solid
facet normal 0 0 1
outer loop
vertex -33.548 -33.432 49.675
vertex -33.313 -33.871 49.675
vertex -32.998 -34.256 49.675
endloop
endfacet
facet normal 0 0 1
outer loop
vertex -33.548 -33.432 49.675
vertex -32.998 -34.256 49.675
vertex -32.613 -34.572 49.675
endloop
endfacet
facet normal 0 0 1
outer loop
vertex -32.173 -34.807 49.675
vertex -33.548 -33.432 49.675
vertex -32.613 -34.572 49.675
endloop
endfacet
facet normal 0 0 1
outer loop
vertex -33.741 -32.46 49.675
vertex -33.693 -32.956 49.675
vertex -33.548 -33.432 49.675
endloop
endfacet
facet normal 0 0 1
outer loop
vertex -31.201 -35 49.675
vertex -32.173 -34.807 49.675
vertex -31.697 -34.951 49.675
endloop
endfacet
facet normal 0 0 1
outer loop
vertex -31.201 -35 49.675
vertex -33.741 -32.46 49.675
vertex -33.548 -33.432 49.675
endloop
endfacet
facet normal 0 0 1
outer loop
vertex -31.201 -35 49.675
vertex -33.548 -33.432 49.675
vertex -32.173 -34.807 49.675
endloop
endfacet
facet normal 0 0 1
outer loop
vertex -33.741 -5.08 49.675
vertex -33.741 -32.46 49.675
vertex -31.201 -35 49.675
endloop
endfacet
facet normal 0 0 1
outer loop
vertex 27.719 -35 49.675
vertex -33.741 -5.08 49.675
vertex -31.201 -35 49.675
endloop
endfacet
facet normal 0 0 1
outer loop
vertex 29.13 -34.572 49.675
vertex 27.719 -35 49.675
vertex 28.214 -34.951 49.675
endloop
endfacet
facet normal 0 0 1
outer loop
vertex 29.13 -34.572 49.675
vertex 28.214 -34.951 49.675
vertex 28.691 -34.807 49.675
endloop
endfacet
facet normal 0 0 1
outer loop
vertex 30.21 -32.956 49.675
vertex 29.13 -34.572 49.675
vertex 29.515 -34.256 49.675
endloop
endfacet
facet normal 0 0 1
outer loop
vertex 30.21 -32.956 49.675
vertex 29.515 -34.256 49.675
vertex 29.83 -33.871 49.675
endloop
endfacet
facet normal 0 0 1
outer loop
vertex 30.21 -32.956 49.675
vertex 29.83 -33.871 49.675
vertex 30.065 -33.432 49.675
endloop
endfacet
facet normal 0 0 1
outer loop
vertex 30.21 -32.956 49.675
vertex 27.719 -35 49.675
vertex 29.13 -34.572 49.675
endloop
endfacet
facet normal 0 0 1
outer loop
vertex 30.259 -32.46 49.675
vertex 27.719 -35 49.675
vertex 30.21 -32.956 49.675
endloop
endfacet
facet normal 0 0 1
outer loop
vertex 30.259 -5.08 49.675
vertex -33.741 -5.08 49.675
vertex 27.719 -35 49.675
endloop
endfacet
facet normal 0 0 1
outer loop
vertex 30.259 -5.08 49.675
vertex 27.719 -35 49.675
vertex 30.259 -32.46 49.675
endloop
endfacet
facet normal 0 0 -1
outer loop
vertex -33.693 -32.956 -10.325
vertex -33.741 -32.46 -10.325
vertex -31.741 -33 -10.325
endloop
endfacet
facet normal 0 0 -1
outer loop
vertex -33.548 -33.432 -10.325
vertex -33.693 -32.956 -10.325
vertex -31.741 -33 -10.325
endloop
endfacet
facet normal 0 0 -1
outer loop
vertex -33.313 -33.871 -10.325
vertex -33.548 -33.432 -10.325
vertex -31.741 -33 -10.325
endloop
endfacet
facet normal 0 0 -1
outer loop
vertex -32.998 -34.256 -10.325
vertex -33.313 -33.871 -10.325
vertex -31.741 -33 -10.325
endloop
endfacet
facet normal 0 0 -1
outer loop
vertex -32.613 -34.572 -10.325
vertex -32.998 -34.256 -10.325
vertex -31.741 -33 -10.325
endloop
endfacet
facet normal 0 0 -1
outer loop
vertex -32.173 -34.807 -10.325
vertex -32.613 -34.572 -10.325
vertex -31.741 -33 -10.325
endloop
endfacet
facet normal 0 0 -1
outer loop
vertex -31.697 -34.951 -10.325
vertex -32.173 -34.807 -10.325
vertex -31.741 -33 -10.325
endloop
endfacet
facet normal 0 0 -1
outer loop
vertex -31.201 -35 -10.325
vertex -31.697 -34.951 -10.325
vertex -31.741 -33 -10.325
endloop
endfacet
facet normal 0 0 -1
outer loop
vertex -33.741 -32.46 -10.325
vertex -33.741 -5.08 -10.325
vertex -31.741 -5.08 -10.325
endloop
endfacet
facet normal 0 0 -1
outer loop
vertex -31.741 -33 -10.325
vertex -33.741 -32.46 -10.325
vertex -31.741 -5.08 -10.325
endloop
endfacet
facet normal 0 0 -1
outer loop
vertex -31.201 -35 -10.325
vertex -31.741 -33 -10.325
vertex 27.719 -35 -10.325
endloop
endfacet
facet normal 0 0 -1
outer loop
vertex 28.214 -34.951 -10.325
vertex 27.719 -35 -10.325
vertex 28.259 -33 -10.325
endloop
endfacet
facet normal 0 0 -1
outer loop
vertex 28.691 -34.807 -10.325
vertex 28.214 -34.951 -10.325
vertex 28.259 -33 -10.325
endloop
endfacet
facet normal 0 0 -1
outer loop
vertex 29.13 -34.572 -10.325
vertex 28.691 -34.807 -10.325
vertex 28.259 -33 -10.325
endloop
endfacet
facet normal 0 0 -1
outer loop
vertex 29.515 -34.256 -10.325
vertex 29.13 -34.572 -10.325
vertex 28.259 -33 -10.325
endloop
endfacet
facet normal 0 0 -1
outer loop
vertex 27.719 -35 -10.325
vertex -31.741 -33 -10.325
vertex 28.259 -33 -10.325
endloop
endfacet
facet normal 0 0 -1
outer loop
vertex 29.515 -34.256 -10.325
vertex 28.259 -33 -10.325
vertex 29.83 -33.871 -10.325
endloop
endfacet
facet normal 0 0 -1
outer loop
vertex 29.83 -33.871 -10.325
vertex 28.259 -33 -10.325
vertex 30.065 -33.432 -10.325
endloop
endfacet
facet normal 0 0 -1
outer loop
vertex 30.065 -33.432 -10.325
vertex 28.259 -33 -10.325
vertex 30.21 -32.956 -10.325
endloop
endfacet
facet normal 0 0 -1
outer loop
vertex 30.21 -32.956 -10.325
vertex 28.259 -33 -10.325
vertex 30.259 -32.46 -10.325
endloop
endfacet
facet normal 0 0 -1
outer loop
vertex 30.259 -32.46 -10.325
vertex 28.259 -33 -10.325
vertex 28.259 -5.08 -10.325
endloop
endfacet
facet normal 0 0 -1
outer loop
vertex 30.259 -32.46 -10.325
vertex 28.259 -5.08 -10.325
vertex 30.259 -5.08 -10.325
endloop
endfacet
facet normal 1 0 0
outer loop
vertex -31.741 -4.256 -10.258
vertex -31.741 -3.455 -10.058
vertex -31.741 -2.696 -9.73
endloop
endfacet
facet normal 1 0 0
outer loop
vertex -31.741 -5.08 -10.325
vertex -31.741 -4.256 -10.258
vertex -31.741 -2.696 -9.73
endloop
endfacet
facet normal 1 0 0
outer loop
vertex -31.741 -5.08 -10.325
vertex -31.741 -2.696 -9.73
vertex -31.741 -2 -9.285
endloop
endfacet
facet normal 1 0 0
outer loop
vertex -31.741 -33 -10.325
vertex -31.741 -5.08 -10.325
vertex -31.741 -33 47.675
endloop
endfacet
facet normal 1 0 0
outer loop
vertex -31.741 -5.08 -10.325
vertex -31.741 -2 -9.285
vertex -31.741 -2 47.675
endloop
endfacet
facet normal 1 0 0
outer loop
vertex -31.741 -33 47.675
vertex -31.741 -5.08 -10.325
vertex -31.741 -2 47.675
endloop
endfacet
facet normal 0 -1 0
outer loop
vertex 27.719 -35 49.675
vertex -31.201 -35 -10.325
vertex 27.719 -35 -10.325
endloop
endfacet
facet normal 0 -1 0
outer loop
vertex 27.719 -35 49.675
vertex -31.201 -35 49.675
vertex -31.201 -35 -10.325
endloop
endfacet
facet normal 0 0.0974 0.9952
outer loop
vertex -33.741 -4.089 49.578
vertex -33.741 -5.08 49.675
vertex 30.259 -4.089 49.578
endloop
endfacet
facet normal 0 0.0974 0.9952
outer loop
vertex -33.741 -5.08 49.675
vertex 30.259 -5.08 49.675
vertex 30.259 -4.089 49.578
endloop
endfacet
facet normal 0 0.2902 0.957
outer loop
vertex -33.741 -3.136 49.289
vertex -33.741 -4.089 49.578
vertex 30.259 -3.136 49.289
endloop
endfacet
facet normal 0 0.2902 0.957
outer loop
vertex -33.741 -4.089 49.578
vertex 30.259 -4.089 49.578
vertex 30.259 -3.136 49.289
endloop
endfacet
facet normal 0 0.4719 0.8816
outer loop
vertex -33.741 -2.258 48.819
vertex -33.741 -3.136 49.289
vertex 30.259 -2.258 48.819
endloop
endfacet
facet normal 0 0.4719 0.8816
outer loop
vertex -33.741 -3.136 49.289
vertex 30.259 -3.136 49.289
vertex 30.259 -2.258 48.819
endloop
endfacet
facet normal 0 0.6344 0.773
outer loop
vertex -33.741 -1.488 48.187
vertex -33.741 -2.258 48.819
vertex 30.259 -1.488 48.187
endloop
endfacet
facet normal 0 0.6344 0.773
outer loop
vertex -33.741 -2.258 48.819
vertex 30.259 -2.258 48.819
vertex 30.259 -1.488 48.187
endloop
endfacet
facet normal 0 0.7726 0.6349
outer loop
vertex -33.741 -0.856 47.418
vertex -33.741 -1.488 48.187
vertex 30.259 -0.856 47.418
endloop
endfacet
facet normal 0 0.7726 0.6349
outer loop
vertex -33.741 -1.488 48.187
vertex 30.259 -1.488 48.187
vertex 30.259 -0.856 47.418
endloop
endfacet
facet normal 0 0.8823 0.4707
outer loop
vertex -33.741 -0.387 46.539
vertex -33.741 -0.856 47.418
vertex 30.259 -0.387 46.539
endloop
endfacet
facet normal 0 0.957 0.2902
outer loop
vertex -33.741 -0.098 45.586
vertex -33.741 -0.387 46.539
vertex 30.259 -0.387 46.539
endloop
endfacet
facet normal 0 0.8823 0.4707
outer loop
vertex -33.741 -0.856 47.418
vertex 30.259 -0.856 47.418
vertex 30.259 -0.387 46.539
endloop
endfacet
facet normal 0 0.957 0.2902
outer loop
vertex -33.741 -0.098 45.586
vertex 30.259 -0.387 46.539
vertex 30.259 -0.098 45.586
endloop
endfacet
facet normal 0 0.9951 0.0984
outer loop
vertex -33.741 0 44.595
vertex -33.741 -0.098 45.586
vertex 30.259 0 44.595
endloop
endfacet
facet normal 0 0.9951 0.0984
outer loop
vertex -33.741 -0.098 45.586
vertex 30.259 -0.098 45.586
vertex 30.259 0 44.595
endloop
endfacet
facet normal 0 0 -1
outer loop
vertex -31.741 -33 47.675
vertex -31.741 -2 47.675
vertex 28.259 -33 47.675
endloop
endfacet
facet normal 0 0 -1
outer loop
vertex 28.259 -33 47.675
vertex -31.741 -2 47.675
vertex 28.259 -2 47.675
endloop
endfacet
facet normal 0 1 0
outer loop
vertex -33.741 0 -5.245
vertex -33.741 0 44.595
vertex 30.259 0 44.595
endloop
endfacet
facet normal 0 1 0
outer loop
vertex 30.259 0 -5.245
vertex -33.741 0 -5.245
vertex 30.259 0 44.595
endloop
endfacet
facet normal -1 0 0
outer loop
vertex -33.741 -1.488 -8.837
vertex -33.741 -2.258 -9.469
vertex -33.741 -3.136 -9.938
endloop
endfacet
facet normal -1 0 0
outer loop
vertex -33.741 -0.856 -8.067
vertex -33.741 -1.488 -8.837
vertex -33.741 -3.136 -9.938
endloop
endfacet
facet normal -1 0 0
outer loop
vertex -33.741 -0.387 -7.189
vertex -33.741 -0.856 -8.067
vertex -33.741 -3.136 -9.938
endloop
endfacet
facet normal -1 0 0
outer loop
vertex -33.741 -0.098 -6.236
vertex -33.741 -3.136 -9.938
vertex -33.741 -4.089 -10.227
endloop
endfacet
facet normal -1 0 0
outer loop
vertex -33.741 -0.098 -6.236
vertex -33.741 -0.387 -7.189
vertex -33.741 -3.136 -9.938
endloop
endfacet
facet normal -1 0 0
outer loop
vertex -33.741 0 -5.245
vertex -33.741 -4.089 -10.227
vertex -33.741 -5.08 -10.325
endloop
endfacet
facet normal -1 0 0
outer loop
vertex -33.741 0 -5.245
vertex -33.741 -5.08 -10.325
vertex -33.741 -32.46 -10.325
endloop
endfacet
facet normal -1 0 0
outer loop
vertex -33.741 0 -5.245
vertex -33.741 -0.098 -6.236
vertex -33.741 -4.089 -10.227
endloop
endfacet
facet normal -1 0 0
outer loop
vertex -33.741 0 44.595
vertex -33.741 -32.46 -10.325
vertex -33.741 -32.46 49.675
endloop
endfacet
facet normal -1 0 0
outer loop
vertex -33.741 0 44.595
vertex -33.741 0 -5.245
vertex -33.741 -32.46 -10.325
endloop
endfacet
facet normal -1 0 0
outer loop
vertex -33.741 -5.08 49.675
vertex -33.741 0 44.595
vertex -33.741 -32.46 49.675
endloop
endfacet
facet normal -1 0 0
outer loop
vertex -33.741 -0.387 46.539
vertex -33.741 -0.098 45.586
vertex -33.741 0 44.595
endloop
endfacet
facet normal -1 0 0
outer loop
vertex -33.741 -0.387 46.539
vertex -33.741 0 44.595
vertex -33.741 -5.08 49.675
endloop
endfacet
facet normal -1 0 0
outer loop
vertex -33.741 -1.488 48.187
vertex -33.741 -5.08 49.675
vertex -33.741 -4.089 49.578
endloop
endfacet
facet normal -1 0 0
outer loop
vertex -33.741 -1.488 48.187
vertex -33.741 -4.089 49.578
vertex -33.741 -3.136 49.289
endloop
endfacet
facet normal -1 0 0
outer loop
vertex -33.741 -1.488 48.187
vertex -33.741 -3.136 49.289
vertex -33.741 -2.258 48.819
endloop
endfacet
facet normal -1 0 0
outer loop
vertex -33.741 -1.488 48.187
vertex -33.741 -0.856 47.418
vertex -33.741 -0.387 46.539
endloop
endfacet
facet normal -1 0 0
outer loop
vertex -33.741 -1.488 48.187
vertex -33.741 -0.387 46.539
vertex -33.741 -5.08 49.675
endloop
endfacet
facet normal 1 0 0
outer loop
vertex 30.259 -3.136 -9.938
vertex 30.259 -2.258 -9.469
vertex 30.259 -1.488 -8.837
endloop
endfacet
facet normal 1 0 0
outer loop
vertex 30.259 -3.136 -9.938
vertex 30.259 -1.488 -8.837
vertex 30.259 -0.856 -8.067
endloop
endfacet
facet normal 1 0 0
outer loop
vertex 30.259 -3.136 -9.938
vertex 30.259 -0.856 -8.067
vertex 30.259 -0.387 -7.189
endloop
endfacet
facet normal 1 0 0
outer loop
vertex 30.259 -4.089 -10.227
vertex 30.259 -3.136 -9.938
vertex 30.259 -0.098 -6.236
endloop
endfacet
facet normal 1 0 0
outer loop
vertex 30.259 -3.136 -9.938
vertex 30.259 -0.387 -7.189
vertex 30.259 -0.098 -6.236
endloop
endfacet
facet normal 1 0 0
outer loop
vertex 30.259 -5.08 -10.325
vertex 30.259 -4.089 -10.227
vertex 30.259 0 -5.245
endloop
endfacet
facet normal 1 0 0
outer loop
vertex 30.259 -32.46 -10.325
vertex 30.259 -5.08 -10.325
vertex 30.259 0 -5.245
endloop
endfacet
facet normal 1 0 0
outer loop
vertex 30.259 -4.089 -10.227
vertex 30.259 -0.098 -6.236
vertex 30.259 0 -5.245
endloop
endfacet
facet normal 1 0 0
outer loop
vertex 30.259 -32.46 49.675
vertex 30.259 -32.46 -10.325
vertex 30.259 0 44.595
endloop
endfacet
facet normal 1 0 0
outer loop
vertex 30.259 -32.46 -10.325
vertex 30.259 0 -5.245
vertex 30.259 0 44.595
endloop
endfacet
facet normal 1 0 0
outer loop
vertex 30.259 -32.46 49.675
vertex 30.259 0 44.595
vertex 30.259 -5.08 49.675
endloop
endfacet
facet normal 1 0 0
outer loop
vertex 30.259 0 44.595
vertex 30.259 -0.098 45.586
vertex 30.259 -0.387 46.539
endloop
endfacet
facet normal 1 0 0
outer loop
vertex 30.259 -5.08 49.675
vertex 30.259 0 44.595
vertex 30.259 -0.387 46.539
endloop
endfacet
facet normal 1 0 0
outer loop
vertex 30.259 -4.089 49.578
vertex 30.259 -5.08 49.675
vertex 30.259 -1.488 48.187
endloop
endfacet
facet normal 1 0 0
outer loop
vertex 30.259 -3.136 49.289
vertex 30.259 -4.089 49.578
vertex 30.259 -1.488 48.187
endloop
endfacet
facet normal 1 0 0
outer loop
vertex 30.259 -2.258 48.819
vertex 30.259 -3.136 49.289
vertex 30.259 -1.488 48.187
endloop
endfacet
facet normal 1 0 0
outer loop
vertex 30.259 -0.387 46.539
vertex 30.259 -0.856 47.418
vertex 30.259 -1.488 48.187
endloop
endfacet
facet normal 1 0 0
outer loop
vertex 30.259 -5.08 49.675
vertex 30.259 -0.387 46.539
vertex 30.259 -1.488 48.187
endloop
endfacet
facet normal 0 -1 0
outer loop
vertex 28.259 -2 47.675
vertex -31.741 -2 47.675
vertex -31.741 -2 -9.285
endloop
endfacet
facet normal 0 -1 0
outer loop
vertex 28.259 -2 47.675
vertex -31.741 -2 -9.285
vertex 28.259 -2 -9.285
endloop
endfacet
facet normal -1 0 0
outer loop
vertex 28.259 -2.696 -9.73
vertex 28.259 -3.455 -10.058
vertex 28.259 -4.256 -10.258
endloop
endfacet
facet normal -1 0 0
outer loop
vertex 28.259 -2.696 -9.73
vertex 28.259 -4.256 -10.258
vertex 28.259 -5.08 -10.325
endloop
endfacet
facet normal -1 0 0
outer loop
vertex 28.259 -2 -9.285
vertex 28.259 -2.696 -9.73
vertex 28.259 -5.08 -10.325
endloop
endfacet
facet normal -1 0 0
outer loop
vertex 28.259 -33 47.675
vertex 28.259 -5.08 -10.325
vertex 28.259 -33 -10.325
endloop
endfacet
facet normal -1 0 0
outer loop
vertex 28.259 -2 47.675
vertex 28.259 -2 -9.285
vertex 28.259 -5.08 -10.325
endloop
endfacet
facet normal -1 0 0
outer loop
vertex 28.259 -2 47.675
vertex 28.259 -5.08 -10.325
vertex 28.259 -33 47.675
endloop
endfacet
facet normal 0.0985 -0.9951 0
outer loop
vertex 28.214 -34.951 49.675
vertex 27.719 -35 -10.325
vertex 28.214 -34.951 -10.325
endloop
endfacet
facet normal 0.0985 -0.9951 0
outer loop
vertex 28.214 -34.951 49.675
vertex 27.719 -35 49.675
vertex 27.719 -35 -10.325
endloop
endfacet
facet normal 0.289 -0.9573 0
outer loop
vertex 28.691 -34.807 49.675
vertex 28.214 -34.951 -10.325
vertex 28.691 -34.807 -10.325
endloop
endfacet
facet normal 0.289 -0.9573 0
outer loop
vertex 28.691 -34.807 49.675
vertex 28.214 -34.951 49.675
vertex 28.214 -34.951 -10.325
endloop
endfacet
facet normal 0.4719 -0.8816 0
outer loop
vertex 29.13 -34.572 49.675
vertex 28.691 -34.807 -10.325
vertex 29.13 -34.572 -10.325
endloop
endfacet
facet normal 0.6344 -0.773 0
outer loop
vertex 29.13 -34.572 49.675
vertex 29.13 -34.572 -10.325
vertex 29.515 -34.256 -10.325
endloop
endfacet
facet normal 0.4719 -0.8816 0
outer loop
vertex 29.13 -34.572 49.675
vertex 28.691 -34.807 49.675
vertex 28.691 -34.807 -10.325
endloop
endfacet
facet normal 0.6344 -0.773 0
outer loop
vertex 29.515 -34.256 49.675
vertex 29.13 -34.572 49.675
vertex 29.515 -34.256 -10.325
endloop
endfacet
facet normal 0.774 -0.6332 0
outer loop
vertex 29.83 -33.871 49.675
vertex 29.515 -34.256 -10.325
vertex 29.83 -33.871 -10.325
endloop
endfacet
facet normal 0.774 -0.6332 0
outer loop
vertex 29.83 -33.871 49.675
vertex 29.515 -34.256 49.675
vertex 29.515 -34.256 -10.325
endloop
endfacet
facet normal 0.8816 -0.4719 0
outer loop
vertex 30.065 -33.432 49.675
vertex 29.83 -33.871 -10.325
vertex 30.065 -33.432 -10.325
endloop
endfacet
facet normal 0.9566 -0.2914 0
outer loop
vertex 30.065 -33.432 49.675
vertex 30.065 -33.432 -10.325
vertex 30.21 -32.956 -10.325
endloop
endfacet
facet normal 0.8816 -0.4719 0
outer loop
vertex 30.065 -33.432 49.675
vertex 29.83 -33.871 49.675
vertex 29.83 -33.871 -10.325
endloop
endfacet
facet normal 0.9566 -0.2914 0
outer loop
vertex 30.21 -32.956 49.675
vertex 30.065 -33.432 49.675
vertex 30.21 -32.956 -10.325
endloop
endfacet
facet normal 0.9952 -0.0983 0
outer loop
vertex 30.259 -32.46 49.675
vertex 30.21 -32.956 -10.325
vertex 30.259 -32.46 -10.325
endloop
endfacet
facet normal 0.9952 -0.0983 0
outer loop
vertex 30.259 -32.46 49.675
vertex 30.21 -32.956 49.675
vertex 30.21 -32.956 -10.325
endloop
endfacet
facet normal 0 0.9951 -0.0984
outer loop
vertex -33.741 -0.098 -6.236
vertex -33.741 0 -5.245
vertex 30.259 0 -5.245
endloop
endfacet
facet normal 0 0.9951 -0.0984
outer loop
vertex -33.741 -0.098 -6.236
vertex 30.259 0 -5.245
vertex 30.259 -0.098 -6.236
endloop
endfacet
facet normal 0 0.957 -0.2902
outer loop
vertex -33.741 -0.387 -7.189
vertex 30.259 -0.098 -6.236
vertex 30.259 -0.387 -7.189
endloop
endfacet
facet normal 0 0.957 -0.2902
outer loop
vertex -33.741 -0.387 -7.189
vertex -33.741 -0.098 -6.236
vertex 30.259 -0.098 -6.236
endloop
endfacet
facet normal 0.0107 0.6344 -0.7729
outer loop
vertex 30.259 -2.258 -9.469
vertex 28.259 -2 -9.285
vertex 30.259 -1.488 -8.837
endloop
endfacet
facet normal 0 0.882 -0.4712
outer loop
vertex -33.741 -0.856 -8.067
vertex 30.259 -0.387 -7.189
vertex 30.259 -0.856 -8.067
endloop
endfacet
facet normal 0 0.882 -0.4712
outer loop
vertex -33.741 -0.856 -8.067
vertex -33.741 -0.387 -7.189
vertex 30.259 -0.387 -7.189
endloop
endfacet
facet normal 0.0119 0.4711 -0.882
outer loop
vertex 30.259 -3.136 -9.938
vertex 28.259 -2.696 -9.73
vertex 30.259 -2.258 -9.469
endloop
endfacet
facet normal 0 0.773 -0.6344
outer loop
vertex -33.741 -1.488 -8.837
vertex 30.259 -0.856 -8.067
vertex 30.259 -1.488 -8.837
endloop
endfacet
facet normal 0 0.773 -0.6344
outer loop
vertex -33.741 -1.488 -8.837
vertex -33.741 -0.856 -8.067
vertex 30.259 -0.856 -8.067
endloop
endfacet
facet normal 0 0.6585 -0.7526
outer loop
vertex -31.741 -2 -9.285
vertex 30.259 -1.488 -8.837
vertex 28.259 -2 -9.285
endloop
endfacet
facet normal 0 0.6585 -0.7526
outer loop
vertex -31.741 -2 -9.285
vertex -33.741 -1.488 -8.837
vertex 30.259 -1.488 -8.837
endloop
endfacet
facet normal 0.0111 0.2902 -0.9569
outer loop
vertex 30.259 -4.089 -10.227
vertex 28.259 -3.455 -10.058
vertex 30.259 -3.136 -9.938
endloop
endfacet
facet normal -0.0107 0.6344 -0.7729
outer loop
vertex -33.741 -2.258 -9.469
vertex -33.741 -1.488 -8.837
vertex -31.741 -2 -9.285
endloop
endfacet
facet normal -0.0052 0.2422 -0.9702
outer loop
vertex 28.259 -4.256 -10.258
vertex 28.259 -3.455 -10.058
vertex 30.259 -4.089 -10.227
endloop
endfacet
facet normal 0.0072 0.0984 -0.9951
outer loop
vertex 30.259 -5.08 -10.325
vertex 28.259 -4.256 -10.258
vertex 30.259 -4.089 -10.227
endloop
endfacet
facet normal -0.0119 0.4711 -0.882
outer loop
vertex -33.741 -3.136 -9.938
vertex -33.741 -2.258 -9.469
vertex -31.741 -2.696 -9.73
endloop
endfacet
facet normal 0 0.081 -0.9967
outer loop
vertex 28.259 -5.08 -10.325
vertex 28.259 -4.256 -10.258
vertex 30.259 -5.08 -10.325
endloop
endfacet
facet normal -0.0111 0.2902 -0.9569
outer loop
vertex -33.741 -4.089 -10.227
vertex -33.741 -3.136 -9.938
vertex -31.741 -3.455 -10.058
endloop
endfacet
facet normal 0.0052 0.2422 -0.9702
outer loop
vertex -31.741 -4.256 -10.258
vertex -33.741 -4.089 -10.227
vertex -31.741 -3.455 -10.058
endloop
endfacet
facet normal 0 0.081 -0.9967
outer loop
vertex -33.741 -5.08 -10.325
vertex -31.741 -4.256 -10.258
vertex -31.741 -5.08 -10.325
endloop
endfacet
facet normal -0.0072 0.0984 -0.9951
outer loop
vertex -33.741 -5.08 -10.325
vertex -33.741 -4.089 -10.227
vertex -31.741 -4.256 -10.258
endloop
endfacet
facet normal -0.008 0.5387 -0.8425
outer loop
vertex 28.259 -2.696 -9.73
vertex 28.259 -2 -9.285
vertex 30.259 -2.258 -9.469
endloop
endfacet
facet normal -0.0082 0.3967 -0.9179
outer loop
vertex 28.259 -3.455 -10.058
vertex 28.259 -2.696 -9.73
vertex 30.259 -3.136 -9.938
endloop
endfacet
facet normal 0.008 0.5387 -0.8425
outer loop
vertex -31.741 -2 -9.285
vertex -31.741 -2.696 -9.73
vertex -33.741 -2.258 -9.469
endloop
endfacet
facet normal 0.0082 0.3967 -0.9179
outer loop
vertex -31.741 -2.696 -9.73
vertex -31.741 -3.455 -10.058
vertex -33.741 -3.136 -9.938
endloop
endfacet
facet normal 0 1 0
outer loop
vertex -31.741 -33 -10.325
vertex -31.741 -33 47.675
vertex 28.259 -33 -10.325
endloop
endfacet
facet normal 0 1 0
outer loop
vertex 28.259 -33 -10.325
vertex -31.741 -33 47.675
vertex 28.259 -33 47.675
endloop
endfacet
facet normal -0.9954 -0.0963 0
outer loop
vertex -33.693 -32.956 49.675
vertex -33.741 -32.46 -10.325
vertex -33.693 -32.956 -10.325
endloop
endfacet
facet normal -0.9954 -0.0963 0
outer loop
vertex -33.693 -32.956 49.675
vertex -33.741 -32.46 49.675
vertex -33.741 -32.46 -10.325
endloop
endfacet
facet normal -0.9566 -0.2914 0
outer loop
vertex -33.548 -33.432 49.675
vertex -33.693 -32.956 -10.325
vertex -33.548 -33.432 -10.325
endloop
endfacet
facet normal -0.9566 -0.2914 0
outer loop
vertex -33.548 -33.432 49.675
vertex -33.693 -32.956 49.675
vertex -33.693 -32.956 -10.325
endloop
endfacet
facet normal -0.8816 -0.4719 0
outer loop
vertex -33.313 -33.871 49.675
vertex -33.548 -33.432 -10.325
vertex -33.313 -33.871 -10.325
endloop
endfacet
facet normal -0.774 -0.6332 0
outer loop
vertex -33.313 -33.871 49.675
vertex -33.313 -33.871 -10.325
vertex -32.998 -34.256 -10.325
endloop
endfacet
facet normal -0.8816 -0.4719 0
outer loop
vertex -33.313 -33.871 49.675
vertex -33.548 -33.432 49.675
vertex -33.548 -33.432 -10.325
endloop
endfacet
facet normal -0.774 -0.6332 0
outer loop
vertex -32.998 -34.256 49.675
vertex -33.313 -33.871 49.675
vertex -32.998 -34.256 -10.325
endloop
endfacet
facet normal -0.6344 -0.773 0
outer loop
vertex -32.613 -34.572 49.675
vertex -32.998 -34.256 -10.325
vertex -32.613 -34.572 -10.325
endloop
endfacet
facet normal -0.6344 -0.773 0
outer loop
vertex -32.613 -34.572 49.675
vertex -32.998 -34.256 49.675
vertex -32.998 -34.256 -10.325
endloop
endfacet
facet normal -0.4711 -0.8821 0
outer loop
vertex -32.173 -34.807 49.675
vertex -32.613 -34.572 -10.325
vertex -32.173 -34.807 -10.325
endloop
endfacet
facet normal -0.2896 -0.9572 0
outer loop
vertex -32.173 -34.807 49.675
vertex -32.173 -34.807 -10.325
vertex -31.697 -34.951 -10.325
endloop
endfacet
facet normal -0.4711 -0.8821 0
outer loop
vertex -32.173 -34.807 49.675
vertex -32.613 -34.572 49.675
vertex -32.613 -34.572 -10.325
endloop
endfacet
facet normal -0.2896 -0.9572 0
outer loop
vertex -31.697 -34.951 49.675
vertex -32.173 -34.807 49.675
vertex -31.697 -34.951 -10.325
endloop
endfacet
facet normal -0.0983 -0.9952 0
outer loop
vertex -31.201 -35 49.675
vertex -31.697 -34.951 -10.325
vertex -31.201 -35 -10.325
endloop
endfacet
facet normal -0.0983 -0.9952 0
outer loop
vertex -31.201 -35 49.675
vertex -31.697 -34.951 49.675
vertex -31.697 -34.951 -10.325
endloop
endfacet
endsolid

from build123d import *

# Parameters (mm, degrees)
F0_W        = 64
F0_H        = 60
F1_DEPTH    = 35
F2_T        = -2
F3_R        = 5.08
F4_T1_DEPTH = 89.4
F5_R        = 2.54


# Not quite as in the source:
# - a fillet or chamfer that OpenCascade refuses, or shapes differently, is made with other operations: its cross-section is extruded or revolved along the edge and cut away or added


with BuildPart() as f1:
    # F0 (on Front) → F1 (new body)
    with BuildSketch(Plane.XZ):
        with Locations((-1.7414748222, 19.6752779907)):
            Rectangle(F0_W, F0_H)
    extrude(amount=F1_DEPTH)

    # F2
    f2_openings = [f1.faces().sort_by_distance(p)[0] for p in [
        (-1.741475, -17.5, -10.324722),
    ]]
    offset(amount=F2_T, openings=f2_openings)

    # F3
    f3_edges = [f1.edges().sort_by_distance(p)[0] for p in [
        (-1.741475, 0, 49.675278),
    ]]
    fillet(f3_edges, radius=F3_R)

    # F4: fillet of radius 5.08 on 1 edges, made by hand

    # F4_s2 → F4_t1 (cut)
    with BuildSketch(Plane.YZ.offset(-46.4414748222)):
        with BuildLine():
            ThreePointArc((0, -5.2447220093), (-1.4878975516, -8.8368244577), (-5.08, -10.3247220093))
            Line((-5.08, -10.3247220093), (0, -10.3247220093))
            Line((0, -10.3247220093), (0, -5.2447220093))
        make_face()
    extrude(amount=F4_T1_DEPTH, mode=Mode.SUBTRACT)

    # F5
    f5_edges = [f1.edges().sort_by_distance(p)[0] for p in [
        (-33.741475, -35, 19.675278),
        (30.258525, -35, 19.675278),
    ]]
    fillet(f5_edges, radius=F5_R)


solid = f1.part
